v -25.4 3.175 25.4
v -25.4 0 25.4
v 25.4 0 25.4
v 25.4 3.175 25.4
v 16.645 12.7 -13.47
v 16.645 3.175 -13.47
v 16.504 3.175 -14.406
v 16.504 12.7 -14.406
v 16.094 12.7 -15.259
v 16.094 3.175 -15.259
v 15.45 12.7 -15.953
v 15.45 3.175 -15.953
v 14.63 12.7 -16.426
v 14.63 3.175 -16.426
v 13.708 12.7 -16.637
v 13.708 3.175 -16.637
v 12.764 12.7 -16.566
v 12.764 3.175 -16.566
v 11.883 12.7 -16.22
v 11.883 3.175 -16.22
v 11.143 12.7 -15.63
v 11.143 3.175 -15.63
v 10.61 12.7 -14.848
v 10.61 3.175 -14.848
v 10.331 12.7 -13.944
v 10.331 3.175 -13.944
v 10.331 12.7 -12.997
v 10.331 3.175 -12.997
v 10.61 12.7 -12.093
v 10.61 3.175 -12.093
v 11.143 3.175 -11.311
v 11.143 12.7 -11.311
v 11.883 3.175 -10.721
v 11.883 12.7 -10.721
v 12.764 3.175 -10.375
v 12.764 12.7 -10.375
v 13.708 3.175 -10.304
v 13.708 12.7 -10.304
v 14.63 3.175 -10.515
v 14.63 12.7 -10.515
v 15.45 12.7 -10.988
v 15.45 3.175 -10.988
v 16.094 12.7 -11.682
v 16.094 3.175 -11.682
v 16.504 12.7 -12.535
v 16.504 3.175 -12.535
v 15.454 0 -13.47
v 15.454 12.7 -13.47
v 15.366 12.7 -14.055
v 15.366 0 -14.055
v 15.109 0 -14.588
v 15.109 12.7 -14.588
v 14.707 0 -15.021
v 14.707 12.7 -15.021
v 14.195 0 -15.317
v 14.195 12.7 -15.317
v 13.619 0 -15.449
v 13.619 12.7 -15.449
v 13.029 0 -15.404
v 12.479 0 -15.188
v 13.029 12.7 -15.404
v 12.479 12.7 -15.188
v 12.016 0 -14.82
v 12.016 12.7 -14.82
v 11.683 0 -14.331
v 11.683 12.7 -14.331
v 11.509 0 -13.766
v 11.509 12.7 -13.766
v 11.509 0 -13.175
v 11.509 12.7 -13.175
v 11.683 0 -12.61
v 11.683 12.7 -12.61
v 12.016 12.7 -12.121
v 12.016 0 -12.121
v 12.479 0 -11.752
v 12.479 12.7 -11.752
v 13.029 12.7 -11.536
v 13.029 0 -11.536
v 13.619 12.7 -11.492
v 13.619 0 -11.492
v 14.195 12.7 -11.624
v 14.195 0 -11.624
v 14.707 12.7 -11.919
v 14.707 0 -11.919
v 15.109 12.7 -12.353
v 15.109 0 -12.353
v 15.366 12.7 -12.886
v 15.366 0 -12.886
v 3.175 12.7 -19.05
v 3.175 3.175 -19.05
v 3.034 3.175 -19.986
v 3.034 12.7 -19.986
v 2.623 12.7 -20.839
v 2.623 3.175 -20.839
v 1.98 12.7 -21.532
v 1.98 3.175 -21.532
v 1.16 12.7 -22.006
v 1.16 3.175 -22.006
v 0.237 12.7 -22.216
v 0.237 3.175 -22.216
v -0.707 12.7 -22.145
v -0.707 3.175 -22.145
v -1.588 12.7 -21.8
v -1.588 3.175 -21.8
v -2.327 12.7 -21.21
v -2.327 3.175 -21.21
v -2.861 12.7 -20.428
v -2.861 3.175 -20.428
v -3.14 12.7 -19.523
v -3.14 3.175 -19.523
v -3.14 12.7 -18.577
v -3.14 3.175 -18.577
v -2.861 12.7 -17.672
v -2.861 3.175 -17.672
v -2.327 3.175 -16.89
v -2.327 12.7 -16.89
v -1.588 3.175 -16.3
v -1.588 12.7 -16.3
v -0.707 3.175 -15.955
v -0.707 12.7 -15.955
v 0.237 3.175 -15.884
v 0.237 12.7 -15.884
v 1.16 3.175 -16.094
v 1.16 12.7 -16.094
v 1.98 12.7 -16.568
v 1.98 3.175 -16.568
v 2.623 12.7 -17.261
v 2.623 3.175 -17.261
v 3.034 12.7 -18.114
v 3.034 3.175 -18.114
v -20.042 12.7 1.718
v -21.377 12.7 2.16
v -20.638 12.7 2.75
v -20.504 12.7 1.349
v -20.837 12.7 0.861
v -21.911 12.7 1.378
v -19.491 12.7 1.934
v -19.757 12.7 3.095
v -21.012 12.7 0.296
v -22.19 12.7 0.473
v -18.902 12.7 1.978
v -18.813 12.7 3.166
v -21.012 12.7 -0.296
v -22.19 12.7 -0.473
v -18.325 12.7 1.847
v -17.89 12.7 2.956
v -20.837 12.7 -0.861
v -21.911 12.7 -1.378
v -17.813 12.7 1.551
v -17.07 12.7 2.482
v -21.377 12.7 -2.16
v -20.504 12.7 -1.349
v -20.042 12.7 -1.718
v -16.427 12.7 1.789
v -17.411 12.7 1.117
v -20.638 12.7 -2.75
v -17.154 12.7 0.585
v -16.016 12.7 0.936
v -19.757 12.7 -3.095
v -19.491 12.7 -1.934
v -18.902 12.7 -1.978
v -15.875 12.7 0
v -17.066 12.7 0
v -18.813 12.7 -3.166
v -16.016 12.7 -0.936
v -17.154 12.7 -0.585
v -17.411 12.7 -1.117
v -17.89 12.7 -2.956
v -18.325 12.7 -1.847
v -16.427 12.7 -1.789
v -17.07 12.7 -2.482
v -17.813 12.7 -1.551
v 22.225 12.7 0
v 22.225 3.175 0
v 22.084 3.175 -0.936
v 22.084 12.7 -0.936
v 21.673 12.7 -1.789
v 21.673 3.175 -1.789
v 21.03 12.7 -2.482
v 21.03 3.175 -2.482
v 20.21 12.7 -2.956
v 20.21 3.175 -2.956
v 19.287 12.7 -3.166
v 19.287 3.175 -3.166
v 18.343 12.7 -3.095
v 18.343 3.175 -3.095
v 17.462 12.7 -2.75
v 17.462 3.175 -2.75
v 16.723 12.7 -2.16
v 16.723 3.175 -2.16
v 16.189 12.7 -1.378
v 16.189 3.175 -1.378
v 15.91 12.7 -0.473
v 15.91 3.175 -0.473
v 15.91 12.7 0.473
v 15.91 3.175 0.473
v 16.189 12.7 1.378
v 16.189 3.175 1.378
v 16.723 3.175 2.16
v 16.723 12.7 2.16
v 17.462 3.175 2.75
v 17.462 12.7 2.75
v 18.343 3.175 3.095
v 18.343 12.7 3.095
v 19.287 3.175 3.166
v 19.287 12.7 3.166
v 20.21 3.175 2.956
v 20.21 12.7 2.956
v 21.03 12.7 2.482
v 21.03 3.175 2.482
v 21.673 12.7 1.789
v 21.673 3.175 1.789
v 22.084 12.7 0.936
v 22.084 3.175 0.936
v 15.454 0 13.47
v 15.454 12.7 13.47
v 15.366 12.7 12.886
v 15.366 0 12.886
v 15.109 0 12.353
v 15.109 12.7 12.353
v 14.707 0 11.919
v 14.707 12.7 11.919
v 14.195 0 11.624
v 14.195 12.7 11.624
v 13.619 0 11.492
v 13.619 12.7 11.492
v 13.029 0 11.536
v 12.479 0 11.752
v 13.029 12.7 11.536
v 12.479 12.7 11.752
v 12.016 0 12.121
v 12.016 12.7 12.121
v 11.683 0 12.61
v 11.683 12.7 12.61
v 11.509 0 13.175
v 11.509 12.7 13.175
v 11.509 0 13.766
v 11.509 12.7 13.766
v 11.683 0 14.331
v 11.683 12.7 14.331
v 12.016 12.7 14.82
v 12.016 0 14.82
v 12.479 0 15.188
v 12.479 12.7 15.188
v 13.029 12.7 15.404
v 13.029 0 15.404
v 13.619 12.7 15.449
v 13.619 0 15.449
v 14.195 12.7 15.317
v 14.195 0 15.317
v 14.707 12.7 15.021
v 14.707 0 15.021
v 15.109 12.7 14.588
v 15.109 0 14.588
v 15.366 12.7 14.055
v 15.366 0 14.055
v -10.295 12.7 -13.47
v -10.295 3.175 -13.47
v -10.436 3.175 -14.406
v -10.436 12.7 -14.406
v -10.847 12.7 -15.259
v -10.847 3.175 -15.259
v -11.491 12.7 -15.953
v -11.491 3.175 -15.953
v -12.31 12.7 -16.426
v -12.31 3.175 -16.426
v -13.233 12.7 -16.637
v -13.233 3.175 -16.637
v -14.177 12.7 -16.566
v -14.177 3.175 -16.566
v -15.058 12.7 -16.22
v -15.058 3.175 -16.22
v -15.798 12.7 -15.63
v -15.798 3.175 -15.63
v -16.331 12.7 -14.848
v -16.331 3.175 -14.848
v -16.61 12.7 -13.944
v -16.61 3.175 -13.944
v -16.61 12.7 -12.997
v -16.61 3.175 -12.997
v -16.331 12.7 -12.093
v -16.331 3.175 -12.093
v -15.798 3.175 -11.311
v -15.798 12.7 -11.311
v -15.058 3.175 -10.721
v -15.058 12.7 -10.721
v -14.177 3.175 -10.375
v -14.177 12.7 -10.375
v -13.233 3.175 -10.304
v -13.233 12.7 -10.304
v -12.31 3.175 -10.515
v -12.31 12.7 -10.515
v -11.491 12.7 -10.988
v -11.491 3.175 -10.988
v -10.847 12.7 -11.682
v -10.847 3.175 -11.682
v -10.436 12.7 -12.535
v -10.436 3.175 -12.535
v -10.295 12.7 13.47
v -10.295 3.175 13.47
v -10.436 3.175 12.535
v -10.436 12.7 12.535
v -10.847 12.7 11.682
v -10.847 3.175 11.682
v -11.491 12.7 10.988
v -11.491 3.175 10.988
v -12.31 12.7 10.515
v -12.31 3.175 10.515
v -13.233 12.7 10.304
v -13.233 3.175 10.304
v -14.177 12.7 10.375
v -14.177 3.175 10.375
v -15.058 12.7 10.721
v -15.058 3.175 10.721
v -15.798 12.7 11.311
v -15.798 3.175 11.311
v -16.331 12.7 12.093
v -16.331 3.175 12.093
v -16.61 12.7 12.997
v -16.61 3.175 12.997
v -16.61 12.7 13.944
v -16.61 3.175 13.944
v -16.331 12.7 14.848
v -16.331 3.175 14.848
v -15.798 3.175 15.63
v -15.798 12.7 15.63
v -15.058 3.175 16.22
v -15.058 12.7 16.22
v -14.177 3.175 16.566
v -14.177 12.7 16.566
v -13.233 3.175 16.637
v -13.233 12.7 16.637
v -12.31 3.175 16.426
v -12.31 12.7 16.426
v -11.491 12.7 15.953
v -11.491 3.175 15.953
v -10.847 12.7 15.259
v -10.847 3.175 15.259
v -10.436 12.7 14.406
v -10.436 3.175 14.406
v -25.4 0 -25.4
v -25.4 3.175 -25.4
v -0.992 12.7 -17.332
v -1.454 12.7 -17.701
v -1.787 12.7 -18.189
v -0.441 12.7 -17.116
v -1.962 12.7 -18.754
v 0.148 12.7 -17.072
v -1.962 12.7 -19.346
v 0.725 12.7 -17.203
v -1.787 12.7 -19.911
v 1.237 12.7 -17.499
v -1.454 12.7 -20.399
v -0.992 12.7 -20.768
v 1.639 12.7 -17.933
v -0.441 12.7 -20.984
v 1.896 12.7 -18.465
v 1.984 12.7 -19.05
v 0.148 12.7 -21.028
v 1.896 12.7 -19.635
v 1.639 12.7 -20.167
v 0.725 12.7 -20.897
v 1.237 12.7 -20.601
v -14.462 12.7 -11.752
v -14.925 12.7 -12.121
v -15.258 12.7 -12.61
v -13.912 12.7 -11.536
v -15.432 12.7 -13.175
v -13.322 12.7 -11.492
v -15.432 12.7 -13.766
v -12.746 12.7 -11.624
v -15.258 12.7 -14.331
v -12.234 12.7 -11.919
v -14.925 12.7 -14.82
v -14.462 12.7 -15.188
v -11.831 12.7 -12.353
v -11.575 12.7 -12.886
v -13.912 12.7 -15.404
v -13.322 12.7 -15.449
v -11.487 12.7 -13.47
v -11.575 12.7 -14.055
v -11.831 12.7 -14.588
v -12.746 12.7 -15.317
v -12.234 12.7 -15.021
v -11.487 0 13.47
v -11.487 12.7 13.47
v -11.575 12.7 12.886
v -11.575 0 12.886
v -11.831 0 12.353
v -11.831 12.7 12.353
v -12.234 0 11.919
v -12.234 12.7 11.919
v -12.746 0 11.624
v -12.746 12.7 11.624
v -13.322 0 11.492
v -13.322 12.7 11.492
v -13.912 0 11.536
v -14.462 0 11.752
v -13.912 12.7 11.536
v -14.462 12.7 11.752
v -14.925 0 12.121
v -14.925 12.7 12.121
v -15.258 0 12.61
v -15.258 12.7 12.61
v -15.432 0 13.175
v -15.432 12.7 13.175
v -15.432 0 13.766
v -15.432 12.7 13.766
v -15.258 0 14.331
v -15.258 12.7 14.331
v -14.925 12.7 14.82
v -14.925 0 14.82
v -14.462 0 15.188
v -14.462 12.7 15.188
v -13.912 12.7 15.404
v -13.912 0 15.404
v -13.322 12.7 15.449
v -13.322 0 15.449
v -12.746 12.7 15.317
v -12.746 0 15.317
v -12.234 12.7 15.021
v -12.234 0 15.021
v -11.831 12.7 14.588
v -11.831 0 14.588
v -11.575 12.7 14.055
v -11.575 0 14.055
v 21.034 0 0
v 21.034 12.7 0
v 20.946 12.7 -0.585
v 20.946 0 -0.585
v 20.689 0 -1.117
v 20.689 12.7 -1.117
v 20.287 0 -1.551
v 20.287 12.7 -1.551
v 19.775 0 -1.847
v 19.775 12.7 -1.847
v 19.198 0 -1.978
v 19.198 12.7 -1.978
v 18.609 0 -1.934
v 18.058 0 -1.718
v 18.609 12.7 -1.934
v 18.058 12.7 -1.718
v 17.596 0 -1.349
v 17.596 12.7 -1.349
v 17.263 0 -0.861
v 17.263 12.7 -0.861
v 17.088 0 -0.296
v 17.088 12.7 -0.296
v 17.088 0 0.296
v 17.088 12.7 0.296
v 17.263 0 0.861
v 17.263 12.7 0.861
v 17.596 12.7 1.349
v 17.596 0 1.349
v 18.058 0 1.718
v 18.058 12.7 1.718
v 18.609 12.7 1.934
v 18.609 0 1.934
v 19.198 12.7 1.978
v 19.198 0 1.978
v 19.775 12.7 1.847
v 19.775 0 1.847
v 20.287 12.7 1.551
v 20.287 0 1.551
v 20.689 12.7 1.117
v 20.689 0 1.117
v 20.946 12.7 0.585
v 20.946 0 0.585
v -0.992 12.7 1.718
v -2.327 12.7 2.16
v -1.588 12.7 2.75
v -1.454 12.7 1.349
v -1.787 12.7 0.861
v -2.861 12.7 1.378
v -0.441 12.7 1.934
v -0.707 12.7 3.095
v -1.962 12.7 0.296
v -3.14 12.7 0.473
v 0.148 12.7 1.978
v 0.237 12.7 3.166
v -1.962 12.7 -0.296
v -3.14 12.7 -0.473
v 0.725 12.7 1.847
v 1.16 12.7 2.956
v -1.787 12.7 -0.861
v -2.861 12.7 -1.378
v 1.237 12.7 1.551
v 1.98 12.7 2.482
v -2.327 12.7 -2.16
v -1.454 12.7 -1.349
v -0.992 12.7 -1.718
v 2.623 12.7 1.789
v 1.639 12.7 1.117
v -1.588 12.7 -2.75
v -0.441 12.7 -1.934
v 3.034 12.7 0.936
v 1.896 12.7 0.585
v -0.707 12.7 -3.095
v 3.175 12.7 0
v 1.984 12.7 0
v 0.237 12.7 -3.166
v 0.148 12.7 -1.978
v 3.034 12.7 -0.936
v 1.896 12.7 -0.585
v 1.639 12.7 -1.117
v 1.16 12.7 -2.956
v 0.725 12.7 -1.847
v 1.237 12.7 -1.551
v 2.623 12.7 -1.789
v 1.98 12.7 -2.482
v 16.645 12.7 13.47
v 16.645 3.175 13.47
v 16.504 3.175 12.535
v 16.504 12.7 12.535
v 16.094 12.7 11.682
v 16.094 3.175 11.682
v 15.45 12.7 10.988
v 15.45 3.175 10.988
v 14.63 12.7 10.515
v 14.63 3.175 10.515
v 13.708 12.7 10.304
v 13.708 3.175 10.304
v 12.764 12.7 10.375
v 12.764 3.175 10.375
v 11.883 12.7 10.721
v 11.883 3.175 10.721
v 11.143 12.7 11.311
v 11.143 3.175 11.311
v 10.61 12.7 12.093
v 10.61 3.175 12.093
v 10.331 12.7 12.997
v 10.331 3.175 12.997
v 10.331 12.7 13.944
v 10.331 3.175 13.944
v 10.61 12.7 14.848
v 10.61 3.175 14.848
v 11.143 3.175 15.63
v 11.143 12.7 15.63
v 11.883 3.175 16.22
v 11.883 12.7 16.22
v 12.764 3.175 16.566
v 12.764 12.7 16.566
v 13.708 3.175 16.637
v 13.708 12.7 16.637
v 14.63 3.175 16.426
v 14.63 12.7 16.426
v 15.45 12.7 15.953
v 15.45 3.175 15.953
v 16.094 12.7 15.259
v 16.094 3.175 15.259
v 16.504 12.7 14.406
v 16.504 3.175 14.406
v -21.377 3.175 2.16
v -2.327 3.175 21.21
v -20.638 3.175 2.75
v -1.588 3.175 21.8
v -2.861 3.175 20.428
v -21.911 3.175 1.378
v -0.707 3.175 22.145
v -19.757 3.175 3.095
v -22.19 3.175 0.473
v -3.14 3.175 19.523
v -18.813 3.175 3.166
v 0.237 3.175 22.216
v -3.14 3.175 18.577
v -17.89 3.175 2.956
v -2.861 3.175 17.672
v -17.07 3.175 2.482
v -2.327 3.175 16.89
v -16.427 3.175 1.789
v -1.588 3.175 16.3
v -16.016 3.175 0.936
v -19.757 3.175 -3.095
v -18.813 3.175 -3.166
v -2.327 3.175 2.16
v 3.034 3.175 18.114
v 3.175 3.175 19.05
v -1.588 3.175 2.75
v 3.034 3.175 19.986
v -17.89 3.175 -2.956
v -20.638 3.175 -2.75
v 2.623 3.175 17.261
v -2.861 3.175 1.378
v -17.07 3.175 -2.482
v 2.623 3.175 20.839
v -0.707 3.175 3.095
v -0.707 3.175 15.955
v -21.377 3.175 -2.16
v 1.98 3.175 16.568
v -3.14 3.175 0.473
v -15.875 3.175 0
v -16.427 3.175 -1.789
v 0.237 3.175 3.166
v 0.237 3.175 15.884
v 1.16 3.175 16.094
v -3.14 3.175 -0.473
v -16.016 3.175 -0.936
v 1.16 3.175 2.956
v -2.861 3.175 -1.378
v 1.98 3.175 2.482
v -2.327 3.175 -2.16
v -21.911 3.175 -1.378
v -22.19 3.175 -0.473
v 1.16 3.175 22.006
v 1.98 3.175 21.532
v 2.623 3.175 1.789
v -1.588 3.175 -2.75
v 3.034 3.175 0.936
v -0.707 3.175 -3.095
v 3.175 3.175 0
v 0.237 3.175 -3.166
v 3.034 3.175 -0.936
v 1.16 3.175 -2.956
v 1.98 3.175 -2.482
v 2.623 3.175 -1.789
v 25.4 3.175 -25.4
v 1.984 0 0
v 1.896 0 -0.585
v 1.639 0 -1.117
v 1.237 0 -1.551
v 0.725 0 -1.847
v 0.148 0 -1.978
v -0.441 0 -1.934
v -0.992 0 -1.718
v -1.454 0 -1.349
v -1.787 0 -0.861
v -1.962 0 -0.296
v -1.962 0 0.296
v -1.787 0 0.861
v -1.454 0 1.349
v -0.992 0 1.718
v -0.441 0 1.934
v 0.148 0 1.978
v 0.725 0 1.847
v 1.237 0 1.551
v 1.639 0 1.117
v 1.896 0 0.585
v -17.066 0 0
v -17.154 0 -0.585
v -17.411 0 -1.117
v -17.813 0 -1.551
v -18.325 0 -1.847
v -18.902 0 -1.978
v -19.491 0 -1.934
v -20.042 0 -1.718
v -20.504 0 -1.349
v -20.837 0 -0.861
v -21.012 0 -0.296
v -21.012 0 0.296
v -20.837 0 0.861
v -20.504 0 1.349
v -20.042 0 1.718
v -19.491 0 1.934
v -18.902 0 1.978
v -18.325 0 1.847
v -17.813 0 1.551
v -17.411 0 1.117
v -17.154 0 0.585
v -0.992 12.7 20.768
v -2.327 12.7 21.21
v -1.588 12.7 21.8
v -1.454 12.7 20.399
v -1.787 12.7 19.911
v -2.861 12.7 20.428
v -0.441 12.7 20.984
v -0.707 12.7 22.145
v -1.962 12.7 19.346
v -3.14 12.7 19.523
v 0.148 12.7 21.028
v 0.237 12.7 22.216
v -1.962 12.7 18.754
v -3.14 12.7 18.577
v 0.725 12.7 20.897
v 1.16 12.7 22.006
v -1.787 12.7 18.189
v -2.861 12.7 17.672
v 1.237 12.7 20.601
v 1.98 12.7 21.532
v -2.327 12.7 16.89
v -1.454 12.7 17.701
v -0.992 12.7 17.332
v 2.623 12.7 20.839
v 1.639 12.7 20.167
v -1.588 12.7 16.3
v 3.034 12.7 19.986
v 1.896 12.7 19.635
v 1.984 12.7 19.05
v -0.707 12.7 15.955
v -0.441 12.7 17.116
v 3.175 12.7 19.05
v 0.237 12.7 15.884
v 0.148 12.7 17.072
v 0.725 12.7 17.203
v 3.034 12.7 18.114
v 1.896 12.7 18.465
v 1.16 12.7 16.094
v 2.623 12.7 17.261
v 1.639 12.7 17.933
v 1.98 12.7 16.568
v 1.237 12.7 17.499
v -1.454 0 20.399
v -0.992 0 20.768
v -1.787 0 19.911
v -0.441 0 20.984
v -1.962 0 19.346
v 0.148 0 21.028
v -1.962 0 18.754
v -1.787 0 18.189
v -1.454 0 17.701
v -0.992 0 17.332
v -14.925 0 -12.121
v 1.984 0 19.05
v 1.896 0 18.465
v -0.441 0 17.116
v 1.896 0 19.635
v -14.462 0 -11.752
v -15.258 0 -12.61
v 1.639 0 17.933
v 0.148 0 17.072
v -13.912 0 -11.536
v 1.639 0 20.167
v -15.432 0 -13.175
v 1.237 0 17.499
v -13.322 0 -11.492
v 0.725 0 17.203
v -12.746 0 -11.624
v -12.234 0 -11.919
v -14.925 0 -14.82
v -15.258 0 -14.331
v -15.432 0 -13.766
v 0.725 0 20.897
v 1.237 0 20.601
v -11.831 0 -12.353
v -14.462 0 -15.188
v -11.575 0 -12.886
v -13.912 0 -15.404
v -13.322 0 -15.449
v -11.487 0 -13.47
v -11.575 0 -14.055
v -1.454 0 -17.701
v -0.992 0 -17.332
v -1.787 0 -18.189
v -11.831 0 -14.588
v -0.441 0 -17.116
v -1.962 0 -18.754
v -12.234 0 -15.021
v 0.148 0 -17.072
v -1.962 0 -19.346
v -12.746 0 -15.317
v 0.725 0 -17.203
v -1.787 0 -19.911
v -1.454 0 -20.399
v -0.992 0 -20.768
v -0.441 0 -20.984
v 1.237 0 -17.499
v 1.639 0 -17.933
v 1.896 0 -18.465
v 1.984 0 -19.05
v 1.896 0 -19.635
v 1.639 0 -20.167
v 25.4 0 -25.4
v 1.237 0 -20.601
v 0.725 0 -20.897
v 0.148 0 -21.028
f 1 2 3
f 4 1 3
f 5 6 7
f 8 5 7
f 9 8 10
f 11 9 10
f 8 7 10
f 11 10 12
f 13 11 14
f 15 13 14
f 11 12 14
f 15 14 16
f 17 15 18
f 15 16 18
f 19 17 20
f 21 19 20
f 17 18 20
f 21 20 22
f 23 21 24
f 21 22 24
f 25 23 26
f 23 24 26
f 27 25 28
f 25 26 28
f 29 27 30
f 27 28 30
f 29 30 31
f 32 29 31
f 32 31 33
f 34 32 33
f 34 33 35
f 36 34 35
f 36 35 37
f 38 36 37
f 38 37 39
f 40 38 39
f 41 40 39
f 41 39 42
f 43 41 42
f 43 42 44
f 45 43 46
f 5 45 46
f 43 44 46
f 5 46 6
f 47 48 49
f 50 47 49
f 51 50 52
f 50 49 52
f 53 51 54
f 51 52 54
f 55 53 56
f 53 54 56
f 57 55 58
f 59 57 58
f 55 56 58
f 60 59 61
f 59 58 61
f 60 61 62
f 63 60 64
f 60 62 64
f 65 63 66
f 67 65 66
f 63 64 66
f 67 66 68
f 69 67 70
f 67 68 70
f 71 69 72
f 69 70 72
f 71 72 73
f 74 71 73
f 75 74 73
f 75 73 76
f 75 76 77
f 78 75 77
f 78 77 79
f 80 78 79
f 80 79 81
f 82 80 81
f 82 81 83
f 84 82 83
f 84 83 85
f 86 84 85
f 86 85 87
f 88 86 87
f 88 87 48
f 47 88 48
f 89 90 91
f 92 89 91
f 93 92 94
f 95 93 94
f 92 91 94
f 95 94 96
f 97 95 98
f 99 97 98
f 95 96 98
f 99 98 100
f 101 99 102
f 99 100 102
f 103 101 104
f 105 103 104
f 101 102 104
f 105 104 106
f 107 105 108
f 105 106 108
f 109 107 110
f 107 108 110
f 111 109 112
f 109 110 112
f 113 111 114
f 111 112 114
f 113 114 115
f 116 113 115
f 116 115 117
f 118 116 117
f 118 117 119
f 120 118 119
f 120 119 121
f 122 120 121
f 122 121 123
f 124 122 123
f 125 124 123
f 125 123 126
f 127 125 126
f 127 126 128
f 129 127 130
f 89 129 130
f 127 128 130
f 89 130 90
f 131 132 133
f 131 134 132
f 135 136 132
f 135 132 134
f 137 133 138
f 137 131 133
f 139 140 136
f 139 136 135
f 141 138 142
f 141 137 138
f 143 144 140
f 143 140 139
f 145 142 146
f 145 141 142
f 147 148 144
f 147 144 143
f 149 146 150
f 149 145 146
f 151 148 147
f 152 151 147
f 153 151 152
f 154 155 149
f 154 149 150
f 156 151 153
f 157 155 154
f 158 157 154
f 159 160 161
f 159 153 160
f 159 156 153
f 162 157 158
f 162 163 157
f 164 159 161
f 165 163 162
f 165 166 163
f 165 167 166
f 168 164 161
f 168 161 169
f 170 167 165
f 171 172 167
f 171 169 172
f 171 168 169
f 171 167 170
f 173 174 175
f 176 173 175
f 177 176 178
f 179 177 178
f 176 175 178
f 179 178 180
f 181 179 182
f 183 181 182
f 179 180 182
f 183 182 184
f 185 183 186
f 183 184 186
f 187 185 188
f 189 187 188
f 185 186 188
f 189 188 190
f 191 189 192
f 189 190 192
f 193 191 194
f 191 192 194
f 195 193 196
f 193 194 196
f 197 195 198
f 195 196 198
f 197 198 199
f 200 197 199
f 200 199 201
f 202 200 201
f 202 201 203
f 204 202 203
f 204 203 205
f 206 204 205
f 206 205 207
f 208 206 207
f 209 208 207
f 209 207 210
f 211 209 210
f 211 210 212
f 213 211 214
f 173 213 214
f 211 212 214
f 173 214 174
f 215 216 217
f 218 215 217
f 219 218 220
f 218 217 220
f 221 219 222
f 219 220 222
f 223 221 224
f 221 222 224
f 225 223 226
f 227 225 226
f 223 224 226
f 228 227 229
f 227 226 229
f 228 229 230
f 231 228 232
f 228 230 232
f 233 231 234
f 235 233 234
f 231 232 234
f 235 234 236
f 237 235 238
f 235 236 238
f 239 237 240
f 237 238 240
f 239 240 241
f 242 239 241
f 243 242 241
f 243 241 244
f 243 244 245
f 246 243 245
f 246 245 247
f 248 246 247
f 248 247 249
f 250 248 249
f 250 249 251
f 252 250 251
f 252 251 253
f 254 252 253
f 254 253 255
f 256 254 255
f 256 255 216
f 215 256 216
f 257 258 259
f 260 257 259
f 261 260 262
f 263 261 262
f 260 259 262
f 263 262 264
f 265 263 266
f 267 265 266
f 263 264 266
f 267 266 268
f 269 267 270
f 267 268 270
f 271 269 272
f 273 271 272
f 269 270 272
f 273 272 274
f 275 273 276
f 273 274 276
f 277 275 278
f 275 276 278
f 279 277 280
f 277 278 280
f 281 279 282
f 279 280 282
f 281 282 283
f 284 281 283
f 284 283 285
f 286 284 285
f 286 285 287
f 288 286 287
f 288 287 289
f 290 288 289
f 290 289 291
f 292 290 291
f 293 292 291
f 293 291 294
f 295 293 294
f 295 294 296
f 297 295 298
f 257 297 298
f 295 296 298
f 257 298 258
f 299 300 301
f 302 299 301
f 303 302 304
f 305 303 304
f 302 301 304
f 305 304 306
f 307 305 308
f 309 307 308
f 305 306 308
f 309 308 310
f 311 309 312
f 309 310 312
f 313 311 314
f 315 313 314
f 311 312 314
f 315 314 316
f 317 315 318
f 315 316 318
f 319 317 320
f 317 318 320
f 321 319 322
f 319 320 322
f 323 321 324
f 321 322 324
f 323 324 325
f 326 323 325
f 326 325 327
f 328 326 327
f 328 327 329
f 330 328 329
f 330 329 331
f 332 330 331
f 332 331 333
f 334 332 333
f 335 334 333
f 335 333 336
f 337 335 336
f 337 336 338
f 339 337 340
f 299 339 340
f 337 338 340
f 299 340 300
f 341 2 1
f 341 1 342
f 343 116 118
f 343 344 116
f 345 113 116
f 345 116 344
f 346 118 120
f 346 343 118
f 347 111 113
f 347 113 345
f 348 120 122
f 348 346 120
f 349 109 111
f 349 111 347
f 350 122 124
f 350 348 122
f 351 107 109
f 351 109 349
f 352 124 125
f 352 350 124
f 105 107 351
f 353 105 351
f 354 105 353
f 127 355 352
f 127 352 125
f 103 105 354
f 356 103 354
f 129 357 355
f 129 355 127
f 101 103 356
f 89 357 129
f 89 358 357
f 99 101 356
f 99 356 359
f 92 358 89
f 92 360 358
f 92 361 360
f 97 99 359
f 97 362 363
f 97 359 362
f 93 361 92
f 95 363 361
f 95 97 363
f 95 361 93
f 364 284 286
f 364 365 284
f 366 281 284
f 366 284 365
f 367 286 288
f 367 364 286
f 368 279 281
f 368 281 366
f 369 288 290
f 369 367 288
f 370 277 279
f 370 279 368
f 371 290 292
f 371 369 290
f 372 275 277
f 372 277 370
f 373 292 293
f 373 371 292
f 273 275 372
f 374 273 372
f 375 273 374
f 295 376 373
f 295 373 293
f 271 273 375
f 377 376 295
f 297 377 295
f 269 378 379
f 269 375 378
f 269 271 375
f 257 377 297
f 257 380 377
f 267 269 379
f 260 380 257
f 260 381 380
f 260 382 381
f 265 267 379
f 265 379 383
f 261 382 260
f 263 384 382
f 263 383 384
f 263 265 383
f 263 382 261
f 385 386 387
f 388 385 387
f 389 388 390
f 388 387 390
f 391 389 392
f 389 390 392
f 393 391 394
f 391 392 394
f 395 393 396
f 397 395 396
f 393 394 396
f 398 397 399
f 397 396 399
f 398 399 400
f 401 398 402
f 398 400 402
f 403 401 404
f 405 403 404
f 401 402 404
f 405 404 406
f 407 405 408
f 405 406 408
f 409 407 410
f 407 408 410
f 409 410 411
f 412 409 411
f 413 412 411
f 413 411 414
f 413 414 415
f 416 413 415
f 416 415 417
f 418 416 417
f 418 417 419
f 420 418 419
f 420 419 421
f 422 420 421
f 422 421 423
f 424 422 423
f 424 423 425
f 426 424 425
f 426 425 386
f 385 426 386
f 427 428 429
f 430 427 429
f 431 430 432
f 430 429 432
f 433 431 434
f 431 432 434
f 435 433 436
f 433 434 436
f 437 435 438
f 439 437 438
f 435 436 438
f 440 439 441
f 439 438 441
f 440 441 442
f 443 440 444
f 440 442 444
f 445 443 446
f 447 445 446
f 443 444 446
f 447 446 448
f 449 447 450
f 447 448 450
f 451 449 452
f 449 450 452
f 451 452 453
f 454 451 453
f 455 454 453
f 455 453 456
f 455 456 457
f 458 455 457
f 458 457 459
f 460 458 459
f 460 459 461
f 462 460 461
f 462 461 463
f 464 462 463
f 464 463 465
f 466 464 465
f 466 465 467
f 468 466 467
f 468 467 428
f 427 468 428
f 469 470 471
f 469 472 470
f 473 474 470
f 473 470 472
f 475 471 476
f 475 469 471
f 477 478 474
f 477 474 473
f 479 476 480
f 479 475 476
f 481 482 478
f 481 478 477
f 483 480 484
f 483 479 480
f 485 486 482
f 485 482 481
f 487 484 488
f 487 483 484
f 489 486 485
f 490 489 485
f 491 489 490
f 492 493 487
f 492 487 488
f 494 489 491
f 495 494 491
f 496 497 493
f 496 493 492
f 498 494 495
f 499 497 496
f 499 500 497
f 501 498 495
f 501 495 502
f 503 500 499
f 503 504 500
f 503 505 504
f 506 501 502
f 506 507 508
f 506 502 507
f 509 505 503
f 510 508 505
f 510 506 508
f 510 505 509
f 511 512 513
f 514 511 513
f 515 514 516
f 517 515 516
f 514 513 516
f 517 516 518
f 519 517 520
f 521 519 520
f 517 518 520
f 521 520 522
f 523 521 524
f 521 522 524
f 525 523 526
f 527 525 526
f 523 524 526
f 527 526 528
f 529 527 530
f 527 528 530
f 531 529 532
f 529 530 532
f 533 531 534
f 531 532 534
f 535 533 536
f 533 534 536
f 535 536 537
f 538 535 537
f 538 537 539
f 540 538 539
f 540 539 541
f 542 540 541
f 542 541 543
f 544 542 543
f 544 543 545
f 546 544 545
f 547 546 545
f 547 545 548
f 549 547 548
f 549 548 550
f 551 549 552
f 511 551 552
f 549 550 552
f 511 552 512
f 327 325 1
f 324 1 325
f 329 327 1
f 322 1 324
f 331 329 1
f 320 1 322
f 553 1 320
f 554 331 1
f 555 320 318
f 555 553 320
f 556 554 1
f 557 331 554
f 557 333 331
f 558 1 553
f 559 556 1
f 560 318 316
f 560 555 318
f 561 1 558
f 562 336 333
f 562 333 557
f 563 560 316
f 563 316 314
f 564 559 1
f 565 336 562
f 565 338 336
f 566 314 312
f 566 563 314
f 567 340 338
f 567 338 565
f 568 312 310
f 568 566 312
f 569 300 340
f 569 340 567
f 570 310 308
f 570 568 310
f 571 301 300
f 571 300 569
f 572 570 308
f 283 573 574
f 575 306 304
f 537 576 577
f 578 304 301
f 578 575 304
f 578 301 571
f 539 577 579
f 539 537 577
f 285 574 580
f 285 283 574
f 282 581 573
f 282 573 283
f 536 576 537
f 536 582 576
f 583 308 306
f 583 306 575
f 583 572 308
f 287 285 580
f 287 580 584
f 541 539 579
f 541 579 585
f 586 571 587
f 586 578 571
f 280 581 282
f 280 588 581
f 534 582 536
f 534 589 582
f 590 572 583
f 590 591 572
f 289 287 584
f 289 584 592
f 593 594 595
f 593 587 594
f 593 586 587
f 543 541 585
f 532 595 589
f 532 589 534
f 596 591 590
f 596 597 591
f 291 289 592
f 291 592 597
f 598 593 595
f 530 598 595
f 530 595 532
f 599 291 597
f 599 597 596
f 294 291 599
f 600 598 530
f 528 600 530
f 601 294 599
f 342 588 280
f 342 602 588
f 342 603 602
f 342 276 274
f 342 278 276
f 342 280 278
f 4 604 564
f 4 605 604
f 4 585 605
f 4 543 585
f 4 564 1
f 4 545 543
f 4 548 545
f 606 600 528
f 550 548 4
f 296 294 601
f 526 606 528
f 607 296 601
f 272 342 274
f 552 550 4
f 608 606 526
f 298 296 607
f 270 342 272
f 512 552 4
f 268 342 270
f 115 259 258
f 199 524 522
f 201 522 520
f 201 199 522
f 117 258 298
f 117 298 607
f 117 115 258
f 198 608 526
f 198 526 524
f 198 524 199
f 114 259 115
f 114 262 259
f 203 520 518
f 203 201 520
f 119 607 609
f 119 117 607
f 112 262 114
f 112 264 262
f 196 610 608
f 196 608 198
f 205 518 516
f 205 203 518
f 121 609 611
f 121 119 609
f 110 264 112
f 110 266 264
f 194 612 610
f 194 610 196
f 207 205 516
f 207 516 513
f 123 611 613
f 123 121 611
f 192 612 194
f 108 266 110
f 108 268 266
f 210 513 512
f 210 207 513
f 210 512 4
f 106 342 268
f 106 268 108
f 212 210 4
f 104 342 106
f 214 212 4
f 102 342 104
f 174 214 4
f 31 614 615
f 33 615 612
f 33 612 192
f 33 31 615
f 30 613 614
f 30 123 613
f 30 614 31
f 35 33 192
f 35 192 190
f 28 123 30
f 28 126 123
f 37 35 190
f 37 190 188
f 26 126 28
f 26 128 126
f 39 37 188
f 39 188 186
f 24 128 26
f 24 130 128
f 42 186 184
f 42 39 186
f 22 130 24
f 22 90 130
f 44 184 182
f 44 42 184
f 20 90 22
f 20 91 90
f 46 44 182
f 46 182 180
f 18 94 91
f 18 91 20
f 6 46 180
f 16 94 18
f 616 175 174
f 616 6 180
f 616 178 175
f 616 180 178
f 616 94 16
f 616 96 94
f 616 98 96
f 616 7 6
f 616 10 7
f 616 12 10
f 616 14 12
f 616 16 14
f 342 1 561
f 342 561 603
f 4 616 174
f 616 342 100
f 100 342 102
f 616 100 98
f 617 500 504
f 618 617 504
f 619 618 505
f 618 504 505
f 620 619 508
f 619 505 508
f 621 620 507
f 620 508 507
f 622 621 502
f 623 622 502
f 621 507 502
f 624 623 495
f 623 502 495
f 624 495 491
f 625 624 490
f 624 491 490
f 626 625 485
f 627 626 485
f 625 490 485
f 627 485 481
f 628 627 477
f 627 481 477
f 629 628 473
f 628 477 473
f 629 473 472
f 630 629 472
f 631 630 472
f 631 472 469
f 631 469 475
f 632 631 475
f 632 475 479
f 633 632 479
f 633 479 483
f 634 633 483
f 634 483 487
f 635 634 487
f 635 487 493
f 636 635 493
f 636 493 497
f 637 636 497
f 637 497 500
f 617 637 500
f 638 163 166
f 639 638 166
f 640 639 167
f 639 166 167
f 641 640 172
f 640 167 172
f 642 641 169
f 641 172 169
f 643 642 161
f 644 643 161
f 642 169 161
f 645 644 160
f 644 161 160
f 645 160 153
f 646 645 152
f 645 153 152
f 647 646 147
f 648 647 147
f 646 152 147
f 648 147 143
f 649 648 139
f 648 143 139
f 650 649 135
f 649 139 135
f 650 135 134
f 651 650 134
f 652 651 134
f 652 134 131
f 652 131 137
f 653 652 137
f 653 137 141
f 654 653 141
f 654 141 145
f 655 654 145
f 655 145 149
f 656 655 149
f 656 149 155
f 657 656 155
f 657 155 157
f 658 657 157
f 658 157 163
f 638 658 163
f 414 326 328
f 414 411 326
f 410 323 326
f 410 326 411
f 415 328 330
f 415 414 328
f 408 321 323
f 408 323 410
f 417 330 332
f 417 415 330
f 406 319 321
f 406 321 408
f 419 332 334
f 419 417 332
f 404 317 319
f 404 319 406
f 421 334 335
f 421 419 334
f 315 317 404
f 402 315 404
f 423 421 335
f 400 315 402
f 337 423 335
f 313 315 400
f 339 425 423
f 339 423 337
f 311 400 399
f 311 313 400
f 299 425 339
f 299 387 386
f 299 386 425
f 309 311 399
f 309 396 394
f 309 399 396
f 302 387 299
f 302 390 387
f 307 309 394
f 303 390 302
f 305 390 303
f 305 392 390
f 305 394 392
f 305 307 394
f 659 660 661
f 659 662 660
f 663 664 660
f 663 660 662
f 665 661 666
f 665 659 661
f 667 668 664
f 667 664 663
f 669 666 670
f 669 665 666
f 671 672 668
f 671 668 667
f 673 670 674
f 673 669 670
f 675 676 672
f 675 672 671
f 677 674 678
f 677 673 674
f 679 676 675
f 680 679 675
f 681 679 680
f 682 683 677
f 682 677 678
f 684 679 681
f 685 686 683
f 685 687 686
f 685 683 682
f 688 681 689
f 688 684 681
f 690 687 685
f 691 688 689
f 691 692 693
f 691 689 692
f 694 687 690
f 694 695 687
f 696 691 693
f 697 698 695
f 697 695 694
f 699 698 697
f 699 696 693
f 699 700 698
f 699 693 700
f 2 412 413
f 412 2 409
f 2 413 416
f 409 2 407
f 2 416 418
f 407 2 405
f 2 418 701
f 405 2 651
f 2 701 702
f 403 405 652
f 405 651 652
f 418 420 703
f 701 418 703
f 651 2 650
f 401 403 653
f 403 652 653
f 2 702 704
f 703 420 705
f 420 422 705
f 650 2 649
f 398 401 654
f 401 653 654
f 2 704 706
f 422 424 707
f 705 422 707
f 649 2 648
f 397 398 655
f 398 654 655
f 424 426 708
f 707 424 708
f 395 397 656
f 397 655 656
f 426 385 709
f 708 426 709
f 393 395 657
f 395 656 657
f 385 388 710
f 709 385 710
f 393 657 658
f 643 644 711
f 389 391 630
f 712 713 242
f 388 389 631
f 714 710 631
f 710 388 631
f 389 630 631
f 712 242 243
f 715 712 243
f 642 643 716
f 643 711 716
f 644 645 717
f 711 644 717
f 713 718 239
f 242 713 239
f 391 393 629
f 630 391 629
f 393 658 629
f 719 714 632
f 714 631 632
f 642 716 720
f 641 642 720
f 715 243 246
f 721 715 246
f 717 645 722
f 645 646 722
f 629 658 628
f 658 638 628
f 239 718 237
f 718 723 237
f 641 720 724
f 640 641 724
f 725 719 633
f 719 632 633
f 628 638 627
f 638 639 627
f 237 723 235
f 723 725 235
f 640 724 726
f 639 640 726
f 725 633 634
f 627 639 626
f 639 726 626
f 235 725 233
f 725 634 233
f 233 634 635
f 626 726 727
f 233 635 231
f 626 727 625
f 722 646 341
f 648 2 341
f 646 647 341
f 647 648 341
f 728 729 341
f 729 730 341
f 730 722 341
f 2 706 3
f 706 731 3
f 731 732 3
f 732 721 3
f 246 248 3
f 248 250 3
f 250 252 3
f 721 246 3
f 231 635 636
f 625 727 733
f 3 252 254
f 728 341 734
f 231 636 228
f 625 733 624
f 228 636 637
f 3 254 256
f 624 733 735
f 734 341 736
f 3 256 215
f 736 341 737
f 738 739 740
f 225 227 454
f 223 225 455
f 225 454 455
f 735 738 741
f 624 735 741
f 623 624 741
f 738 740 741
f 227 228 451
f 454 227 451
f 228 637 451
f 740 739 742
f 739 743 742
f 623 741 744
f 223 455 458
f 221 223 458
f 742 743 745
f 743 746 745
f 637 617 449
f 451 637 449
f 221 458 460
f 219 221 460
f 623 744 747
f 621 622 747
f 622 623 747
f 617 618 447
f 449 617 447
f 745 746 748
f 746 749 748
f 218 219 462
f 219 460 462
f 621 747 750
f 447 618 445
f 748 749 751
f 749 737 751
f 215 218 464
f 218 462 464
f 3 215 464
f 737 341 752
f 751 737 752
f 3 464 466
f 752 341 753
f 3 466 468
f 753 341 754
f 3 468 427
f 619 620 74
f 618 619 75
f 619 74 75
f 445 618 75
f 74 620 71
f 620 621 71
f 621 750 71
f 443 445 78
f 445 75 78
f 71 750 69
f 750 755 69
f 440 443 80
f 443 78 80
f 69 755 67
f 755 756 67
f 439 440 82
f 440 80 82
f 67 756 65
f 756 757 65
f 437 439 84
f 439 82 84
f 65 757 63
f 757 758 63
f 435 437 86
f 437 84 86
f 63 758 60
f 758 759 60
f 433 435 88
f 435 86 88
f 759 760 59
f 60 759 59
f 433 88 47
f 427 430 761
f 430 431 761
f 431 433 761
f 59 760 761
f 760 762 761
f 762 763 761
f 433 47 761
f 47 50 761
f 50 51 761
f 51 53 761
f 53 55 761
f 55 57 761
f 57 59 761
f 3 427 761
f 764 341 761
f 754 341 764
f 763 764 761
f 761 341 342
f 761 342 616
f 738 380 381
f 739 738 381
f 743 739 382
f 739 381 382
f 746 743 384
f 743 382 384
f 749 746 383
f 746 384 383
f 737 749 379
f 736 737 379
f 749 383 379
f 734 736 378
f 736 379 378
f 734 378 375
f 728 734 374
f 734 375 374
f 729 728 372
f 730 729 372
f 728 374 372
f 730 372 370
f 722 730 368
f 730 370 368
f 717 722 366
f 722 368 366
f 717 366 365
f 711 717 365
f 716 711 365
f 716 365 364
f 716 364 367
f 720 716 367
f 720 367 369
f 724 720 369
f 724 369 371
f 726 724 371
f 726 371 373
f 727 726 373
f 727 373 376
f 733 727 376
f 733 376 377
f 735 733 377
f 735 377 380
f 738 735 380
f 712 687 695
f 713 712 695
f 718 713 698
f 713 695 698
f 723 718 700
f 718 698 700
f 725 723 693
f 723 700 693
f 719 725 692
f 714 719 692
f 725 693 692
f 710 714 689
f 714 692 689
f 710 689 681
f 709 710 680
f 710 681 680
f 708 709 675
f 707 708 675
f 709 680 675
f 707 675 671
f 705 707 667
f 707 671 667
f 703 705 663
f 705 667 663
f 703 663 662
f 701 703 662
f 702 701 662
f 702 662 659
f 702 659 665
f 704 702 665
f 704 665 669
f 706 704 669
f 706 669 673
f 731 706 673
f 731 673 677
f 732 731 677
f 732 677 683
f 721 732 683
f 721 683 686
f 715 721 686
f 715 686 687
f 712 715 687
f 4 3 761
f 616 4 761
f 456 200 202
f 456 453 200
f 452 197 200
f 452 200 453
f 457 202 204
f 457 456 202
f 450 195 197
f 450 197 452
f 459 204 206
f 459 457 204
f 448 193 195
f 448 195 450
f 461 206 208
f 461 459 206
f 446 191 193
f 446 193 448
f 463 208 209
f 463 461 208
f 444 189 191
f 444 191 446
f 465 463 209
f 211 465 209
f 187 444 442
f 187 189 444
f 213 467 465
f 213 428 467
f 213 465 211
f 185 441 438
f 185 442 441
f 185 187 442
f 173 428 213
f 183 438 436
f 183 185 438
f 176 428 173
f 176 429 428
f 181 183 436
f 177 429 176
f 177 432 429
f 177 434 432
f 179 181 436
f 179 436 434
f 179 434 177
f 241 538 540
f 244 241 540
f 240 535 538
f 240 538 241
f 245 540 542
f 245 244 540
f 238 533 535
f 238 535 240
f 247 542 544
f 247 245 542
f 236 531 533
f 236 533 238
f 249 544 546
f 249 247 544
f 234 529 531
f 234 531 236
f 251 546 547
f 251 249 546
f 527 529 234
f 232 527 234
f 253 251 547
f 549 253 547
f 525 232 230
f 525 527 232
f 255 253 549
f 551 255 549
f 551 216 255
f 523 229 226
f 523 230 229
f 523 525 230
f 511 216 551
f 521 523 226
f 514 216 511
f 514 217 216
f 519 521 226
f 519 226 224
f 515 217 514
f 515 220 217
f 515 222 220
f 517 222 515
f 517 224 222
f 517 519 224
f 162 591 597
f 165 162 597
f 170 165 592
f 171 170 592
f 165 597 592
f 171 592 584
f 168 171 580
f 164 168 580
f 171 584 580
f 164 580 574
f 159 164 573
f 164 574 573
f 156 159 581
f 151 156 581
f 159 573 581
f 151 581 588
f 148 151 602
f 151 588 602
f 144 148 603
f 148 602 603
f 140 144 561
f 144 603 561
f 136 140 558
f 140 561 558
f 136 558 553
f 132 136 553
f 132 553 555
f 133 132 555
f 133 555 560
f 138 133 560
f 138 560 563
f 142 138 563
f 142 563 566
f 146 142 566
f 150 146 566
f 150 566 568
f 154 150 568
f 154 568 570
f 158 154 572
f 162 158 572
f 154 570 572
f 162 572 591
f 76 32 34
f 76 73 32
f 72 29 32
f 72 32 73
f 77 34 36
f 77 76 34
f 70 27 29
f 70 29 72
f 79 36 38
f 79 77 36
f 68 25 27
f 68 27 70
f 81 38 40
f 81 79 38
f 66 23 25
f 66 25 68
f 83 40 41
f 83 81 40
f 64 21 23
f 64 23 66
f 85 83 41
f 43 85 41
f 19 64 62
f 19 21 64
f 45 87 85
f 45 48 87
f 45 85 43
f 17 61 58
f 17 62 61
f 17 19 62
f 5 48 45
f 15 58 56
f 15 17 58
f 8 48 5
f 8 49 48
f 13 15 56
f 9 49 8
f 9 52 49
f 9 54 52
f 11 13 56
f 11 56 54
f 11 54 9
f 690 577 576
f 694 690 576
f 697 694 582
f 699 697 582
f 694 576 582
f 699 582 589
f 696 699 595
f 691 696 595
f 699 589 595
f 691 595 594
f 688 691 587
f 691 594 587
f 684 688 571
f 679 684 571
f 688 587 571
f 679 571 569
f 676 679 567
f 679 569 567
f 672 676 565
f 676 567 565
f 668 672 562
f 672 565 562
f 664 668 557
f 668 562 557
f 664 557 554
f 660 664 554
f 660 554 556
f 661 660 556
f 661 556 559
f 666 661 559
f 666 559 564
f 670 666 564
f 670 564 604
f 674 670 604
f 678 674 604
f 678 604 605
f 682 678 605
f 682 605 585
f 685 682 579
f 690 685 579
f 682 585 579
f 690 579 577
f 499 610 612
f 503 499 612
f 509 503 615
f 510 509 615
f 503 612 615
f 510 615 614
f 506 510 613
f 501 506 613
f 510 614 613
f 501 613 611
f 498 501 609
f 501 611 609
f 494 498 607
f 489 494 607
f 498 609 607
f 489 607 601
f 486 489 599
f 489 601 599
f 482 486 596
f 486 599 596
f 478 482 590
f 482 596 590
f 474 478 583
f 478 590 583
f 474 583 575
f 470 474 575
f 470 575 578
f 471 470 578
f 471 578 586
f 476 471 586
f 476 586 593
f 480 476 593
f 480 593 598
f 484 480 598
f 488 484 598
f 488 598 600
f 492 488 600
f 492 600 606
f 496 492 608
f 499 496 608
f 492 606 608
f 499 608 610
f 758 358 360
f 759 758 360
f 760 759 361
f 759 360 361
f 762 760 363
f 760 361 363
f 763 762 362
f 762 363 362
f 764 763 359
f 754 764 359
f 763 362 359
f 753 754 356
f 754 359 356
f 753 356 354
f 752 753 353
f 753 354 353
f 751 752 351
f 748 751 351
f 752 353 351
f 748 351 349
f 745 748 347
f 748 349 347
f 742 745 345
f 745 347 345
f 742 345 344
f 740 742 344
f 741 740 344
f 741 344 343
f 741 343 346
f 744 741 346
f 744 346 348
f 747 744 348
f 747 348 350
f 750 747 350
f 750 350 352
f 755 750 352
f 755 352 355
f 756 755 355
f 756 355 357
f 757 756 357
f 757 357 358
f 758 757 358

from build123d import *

# Parameters (mm, degrees)
SKETCH1_W           = 50.8
SKETCH1_H           = 50.8
BOSS_EXTRUDE1_DEPTH = 3.175
SKETCH2_R           = 3.175
BOSS_EXTRUDE2_DEPTH = 9.525
SKETCH3_R           = 1.98374
CUT_EXTRUDE1_DEPTH  = 13.7


with BuildPart() as part:
    # Sketch1 → Boss-Extrude1 (new body)
    with BuildSketch(Plane(origin=(0, 0, 0), x_dir=(1, 0, 0), z_dir=(0, 1, 0))):
        Rectangle(SKETCH1_W, SKETCH1_H)
    extrude(amount=BOSS_EXTRUDE1_DEPTH)

    # Sketch2 → Boss-Extrude2 (add)
    with BuildSketch(Plane(origin=(0, 3.175, 0), x_dir=(1, 0, 0), z_dir=(0, 1, 0))):
        with Locations((0, 19.05)):
            Circle(SKETCH2_R)
        with Locations((13.470384182, 13.470384182)):
            Circle(SKETCH2_R)
        with Locations((19.05, 0)):
            Circle(SKETCH2_R)
        with Locations((13.470384182, -13.470384182)):
            Circle(SKETCH2_R)
        with Locations((0, -19.05)):
            Circle(SKETCH2_R)
        with Locations((-13.470384182, -13.470384182)):
            Circle(SKETCH2_R)
        with Locations((-19.05, 0)):
            Circle(SKETCH2_R)
        with Locations((-13.470384182, 13.470384182)):
            Circle(SKETCH2_R)
        Circle(SKETCH2_R)
    extrude(amount=BOSS_EXTRUDE2_DEPTH)

    # Sketch3 → Cut-Extrude1 (cut, through all)
    with BuildSketch(Plane(origin=(0, 12.7, 0), x_dir=(1, 0, 0), z_dir=(0, 1, 0))):
        with Locations((0, 19.05)):
            Circle(SKETCH3_R)
        with Locations((13.470384182, 13.470384182)):
            Circle(SKETCH3_R)
        with Locations((19.05, 0)):
            Circle(SKETCH3_R)
        with Locations((13.470384182, -13.470384182)):
            Circle(SKETCH3_R)
        with Locations((0, -19.05)):
            Circle(SKETCH3_R)
        with Locations((-13.470384182, -13.470384182)):
            Circle(SKETCH3_R)
        with Locations((-19.05, 0)):
            Circle(SKETCH3_R)
        with Locations((-13.470384182, 13.470384182)):
            Circle(SKETCH3_R)
        Circle(SKETCH3_R)
    extrude(amount=-CUT_EXTRUDE1_DEPTH, mode=Mode.SUBTRACT)


solid = part.part
